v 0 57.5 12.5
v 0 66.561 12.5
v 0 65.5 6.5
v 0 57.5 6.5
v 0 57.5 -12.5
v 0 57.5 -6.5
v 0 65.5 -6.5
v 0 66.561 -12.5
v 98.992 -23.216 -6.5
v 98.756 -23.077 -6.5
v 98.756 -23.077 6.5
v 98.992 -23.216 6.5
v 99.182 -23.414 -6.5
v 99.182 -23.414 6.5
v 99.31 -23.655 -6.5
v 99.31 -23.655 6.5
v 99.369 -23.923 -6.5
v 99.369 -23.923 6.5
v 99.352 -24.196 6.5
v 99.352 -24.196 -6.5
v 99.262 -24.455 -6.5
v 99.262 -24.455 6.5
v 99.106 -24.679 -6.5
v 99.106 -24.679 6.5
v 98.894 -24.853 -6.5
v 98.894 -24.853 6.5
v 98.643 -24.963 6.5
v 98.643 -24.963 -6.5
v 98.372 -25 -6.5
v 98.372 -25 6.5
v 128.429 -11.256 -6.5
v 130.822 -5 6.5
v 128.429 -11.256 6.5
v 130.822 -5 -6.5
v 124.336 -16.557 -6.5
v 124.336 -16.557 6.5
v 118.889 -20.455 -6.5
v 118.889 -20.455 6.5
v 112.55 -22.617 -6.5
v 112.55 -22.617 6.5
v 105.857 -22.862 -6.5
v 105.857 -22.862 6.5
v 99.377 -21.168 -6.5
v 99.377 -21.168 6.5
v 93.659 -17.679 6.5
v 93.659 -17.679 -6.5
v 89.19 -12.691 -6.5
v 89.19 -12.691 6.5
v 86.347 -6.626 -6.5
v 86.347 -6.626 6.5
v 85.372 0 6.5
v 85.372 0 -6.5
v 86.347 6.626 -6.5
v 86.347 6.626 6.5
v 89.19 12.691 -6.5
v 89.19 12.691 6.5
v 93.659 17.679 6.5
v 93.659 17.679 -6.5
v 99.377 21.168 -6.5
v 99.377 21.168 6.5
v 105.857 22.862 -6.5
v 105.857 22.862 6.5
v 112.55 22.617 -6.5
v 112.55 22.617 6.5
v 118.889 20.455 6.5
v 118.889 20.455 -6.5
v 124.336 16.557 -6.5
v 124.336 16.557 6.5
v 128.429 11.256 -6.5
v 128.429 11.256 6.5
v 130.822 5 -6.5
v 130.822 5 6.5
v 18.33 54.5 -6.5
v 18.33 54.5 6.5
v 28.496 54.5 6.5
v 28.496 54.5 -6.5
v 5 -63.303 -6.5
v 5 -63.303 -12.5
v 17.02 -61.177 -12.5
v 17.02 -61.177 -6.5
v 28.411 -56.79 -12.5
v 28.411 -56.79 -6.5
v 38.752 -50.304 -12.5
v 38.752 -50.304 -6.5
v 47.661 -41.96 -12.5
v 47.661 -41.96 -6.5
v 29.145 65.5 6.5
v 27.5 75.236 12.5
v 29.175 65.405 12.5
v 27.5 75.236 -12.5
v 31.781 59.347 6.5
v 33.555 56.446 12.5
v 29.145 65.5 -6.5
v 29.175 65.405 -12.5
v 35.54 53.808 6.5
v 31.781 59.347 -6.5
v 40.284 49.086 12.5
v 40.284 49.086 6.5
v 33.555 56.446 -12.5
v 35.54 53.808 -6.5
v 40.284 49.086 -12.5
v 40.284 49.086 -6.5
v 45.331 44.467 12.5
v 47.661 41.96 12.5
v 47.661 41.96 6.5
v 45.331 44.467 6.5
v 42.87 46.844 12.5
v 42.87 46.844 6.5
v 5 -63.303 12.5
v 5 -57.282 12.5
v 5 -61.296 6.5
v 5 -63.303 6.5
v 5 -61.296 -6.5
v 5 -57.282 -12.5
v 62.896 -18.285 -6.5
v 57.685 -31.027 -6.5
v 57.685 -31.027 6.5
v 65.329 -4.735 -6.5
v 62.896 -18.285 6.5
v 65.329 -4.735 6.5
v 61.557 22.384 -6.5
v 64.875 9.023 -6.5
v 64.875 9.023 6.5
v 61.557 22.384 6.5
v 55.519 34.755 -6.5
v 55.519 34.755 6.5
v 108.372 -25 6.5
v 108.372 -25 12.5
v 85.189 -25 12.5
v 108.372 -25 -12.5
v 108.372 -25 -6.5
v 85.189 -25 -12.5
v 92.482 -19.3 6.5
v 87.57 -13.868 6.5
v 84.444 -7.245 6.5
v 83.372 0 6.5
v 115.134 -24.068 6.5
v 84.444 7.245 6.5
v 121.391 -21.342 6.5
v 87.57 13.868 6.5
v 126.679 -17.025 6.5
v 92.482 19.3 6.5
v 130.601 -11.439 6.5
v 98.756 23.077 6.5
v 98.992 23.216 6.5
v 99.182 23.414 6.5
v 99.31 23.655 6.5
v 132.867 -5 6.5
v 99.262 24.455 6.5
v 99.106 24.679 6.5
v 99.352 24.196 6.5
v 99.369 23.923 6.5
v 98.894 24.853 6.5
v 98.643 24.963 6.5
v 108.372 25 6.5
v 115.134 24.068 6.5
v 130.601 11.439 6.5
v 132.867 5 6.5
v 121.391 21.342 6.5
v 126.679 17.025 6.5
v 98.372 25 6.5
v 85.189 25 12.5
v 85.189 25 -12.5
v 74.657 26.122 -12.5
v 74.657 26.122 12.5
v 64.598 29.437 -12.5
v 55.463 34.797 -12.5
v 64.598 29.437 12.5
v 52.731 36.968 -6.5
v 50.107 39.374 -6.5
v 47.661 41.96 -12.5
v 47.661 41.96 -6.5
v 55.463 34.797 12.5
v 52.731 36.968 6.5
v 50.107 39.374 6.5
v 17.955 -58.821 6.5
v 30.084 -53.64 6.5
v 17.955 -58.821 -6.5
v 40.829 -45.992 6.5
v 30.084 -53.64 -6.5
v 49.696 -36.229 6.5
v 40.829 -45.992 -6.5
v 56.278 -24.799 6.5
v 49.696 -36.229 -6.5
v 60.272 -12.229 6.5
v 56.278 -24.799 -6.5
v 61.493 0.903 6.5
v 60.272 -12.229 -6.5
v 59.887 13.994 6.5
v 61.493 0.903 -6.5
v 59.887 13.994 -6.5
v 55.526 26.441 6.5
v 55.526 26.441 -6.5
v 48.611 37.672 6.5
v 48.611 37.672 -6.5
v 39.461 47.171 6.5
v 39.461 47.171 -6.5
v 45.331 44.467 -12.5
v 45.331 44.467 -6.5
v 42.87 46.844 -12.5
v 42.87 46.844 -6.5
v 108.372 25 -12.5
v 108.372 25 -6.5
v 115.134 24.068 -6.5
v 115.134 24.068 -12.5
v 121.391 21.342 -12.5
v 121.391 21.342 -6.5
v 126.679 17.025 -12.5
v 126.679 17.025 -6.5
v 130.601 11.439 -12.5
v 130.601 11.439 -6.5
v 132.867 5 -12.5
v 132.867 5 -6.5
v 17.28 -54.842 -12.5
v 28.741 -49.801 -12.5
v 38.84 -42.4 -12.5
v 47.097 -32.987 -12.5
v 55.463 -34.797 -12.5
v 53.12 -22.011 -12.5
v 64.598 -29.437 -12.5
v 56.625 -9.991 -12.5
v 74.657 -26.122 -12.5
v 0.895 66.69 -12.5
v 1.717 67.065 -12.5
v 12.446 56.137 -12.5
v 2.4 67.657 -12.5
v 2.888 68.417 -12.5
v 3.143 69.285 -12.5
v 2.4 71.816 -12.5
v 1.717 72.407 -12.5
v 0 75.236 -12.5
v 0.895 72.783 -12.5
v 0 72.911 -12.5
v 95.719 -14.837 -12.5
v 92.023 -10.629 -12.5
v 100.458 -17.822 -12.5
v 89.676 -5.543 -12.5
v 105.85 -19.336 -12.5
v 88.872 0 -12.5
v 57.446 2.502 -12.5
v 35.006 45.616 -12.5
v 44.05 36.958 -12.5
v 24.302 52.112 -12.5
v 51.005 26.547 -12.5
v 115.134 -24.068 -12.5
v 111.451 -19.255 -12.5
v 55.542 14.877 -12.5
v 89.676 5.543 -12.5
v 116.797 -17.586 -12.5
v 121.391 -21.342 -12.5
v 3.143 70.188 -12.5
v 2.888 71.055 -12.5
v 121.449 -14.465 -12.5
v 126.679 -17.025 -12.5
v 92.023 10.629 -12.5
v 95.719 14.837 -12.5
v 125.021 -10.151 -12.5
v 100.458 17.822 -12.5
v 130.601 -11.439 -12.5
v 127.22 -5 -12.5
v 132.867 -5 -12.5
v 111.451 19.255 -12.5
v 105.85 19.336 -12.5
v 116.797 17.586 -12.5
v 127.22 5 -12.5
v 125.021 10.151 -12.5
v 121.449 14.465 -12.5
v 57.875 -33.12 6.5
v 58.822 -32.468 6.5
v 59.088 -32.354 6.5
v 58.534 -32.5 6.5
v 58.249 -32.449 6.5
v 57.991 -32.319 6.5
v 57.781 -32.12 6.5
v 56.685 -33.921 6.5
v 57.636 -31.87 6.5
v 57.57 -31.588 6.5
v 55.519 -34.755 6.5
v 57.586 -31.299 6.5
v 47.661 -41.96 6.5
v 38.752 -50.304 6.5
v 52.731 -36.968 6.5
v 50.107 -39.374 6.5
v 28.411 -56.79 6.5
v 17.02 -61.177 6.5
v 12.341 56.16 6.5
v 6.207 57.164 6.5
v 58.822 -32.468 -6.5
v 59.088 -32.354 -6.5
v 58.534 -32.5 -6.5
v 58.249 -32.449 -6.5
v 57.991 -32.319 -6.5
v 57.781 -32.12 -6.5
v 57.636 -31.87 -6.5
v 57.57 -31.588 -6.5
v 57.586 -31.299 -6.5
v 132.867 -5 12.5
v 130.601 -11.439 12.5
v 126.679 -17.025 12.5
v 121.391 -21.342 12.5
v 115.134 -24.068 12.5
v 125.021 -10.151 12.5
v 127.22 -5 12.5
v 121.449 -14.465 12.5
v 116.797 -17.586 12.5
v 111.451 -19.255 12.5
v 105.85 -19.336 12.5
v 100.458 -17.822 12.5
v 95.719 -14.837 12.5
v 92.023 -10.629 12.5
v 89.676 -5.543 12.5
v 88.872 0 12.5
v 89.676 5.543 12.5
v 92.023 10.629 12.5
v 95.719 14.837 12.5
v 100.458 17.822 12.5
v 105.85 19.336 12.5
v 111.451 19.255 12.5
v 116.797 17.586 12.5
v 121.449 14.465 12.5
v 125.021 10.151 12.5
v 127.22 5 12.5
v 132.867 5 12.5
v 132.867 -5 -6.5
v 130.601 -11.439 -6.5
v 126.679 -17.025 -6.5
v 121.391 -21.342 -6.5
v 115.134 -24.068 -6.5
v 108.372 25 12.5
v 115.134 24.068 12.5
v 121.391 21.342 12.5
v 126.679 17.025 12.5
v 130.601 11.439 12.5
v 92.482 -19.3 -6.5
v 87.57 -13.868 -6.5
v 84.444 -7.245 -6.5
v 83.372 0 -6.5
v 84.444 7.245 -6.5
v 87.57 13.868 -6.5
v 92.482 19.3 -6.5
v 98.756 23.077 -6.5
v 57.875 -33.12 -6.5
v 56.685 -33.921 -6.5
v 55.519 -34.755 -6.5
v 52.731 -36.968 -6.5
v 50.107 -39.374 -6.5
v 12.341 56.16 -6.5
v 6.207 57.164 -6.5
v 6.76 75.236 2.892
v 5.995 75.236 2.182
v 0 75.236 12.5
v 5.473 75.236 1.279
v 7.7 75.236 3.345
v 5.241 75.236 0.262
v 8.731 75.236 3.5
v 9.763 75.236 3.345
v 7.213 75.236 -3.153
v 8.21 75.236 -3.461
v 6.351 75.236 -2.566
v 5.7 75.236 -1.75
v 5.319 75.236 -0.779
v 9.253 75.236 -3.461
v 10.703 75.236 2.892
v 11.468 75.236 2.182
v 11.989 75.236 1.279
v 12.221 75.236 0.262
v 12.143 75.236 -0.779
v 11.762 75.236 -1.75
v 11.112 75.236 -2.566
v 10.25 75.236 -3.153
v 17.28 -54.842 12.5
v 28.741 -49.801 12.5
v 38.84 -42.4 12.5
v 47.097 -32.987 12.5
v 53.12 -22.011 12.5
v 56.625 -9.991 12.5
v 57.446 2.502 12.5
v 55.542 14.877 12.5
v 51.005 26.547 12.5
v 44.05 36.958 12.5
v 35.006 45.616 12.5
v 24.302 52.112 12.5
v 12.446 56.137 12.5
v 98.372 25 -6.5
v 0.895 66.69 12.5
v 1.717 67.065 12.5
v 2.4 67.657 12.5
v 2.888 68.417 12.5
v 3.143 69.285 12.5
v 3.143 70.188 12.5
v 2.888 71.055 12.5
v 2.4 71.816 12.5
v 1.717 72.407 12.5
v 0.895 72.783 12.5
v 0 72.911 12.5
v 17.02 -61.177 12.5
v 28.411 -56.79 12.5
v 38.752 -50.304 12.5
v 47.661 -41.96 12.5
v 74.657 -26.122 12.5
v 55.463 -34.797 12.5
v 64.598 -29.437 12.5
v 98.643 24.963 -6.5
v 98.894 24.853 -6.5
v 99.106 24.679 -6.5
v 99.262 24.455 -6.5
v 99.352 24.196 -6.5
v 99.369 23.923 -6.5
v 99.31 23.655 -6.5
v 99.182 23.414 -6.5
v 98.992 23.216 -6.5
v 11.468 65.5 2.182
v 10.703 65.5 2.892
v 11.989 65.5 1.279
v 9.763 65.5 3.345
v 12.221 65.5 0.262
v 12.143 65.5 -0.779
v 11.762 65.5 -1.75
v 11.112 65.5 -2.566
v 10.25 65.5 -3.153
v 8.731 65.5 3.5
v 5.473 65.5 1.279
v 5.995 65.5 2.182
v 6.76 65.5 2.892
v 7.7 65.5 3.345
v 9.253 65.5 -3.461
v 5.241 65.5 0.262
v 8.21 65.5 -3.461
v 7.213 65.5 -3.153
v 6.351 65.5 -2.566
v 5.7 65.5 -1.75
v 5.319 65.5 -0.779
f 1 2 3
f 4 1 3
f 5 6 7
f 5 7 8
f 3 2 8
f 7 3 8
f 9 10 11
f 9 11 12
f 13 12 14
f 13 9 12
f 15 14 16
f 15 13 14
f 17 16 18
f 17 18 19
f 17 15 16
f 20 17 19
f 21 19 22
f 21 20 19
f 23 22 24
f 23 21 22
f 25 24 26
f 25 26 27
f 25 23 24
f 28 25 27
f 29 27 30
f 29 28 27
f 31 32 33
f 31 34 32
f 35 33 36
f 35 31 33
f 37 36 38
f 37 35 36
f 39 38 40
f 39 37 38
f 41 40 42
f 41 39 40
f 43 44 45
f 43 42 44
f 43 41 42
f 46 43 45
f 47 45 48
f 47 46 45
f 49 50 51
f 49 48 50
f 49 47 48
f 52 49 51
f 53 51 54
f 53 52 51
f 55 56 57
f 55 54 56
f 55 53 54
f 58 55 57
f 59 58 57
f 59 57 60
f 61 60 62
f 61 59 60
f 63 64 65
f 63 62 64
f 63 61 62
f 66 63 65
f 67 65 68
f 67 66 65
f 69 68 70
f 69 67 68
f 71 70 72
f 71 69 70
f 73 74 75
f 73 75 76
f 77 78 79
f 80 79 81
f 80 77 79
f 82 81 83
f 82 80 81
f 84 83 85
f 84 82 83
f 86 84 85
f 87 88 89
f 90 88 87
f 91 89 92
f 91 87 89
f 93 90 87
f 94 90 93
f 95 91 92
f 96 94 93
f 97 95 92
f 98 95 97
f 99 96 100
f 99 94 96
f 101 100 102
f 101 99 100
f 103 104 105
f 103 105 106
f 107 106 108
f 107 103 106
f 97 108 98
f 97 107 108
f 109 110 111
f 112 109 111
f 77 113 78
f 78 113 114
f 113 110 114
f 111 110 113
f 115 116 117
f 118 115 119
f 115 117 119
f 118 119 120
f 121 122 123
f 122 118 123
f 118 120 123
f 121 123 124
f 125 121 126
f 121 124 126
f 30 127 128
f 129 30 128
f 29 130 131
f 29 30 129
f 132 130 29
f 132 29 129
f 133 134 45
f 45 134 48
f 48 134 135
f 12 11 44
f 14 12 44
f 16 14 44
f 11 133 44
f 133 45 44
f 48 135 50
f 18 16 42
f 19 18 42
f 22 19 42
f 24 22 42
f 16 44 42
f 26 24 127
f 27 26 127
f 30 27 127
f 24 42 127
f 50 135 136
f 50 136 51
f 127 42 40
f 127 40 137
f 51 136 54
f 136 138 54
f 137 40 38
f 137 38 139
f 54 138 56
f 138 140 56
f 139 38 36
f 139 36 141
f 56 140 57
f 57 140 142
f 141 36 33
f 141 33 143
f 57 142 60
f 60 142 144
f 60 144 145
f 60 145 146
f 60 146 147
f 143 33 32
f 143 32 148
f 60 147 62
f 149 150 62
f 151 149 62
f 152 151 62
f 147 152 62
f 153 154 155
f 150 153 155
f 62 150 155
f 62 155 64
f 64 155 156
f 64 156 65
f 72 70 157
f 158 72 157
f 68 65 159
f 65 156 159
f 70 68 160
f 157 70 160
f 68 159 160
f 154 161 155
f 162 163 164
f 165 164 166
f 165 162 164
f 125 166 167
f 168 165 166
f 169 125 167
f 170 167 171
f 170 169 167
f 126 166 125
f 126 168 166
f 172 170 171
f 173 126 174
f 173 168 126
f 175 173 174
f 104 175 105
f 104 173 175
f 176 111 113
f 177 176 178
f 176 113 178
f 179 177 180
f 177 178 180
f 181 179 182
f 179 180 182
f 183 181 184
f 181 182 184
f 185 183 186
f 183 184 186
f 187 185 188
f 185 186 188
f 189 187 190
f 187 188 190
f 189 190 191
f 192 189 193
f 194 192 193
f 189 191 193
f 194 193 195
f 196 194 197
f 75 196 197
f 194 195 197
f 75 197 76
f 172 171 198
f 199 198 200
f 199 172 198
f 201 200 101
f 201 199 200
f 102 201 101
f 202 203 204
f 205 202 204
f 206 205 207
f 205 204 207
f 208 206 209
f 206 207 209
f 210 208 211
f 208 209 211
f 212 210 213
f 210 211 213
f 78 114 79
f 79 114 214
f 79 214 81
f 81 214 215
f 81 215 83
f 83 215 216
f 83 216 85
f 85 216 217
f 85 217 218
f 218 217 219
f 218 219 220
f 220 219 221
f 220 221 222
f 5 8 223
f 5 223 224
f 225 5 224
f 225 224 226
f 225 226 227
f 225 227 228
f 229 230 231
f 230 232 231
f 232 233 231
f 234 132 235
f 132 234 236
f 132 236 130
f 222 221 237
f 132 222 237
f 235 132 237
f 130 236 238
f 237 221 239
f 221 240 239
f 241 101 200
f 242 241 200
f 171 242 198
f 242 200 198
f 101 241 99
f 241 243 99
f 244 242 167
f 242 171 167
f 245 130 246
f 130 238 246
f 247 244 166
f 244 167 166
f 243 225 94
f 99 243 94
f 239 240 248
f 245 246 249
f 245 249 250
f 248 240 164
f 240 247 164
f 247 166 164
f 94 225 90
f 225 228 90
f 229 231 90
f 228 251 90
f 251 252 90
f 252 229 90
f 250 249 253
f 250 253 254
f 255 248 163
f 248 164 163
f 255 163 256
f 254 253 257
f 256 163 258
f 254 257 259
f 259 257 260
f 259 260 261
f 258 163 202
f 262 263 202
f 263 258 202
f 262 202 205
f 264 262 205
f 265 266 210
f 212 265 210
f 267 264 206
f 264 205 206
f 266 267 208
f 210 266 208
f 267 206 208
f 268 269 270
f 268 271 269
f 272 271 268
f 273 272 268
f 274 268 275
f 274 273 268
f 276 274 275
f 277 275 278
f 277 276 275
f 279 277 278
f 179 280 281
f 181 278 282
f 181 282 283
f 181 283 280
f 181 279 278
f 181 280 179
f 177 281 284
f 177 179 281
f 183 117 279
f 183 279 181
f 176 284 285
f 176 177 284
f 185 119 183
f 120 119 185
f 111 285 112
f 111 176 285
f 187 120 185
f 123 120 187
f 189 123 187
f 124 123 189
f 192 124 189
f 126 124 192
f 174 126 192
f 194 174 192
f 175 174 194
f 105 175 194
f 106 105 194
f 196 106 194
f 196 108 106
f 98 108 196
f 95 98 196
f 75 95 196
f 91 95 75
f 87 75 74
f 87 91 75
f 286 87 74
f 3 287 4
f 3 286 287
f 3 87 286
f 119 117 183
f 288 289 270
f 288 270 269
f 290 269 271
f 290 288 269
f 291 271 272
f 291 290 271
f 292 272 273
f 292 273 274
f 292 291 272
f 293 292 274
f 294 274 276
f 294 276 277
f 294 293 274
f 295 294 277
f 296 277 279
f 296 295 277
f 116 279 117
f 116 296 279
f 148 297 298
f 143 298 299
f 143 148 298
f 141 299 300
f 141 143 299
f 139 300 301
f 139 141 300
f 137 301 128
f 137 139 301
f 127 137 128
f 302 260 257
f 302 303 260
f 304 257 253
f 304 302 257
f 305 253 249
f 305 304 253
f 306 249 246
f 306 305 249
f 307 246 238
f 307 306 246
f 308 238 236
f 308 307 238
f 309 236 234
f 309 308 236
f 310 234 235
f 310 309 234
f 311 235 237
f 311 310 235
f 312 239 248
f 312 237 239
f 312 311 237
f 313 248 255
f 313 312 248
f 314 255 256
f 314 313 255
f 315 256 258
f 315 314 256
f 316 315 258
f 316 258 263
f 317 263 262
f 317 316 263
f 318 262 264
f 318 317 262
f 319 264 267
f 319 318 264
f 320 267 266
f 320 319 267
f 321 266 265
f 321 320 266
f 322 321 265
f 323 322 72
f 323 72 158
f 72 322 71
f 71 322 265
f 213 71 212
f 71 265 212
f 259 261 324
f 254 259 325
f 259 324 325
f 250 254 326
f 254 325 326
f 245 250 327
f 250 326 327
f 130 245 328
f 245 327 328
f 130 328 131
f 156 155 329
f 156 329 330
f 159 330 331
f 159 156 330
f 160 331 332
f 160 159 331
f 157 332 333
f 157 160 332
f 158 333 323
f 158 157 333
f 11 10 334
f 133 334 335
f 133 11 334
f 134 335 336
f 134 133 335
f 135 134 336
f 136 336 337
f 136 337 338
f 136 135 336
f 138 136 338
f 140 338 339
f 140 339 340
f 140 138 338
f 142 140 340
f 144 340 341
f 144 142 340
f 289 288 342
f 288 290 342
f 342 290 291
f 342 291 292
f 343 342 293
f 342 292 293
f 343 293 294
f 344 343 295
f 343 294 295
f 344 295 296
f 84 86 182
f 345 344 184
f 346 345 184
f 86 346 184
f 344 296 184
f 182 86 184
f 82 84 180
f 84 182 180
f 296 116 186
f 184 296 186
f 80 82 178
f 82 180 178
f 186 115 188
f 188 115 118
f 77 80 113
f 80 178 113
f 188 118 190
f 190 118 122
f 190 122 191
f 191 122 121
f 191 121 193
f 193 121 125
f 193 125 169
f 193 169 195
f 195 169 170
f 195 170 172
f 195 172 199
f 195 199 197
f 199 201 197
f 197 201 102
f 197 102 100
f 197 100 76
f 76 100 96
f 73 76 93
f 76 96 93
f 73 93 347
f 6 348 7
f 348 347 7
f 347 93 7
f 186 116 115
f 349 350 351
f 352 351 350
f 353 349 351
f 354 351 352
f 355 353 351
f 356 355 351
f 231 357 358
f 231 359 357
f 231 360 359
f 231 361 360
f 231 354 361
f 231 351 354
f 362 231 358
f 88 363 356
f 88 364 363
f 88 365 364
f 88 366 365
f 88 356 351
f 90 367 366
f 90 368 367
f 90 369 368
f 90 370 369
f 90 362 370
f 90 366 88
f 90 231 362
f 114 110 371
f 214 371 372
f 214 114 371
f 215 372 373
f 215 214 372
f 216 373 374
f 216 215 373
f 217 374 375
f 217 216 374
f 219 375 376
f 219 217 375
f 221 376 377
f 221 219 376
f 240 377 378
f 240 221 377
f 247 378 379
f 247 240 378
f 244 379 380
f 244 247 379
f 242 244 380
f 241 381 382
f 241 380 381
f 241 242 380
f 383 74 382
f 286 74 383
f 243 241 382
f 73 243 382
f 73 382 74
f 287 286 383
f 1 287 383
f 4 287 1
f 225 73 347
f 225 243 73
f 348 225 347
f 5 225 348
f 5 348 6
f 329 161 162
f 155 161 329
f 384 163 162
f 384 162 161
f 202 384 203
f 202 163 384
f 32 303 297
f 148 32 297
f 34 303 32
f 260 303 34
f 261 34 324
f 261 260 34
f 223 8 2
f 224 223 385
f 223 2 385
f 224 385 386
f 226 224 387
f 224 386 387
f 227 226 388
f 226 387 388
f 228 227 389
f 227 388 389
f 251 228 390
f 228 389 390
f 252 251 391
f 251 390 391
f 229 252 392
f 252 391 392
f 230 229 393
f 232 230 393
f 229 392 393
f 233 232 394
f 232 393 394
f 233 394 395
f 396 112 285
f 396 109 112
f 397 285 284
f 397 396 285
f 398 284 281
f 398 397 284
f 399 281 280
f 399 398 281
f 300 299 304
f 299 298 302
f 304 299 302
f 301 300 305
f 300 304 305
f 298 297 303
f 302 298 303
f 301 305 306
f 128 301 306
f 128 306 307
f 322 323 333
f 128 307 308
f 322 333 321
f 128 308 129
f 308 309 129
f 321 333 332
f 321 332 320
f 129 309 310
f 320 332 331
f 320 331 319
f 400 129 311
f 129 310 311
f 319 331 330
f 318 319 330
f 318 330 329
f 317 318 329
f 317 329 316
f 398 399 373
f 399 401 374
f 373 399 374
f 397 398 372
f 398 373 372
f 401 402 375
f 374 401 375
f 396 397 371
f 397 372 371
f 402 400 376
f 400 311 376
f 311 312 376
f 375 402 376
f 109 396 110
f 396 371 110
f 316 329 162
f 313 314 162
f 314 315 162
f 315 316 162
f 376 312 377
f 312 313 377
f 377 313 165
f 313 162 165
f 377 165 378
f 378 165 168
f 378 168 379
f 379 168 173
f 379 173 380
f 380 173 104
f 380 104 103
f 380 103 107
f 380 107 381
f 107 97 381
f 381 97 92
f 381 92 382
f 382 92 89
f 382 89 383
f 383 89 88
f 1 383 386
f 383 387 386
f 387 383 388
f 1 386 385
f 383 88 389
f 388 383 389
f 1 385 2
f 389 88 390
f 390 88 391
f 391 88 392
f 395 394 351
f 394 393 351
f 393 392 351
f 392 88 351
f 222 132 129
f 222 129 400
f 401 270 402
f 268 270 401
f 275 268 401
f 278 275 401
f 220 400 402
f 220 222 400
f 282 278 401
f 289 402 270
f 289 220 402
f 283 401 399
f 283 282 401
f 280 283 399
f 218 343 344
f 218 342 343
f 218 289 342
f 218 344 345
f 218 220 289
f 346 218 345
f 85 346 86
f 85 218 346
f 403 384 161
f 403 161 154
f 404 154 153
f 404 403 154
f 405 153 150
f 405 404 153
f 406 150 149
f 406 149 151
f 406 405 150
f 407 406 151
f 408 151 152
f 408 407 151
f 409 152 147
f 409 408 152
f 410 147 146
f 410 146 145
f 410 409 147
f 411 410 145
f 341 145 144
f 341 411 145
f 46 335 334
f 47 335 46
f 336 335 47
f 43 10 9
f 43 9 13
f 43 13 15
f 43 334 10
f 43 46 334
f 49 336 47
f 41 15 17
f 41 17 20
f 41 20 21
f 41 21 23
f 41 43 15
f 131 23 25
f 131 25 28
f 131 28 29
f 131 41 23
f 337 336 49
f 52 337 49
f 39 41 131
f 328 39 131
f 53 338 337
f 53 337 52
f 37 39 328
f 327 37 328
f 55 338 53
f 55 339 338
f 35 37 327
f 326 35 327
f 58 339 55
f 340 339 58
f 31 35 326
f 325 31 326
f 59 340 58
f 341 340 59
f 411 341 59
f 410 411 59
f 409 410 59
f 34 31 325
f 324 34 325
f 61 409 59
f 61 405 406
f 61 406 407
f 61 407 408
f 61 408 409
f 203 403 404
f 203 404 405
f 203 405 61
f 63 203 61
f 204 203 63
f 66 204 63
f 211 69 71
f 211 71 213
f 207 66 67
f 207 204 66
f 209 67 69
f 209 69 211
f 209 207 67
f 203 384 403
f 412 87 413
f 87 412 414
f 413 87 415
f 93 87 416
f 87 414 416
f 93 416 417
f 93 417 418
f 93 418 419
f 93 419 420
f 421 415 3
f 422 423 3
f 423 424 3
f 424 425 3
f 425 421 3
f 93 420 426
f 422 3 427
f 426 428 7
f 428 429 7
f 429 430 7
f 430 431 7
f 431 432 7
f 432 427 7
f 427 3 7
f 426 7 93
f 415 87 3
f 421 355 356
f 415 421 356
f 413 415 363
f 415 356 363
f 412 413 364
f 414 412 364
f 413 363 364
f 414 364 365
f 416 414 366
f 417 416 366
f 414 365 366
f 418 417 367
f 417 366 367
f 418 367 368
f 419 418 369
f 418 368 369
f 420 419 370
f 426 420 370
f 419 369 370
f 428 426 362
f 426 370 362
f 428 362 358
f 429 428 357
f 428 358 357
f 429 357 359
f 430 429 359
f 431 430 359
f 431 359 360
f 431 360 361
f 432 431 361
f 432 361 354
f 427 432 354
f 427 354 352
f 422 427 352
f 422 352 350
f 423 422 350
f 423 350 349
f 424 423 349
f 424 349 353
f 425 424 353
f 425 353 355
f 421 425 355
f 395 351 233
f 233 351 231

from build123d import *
from build123d.topology import SkipClean

# Parameters (mm, degrees)
SKETCH1_R                        = 63.5
SKETCH1_R_2                      = 57.5
MAIN_SHAPE_DEPTH                 = 12.5
MOTOR_MOUNT_REACH                = 92.668
MOTOR_MOUNT_DIRECTION_2_REACH    = 92.668
HARNESS_START                    = -12.5
HARNESS_DEPTH                    = 25
HARNESS_FILLET_R                 = 35
SKETCH3_R                        = 65.5
SKETCH3_R_2                      = 61.5
MAIN_SLOT_DEPTH                  = 6.5
SKETCH8_R                        = 19.5
MOTOR_CUT_DEPTH                  = 154.6383962
SKETCH9_R                        = 25
SKETCH9_R_2                      = 23
MOTOR_SLOT_DEPTH                 = 6.5
MOTOR_MOUNT_FILLET_R             = 50
SKETCH17_W                       = 6.80384635
SKETCH17_H                       = 10
MOTOR_KEYWAY_DEPTH               = 156.156394606
MOTOR_MOUNT_FILLET_OF_MIRROR_2_R = 50
BOLT_HOLES_REACH                 = 194.503
BOLT_HOLES_END_RADIUS            = 65.5
SKETCH13_R                       = 3.5
SKETCH15_W                       = 10
SKETCH15_H                       = 25
MAIN_KEYWAY_DEPTH                = 154.200127936
HARNESS_CUT_DEPTH                = 154.200127936
HARNESS_CUT_DEPTH_BACK           = 154.200127936
SKETCH19_W                       = 13
SKETCH19_H                       = 11
SKETCH22_R                       = 3.175
CUT_EXTRUDE1_DEPTH               = 155.72242625
FILLET1_START                    = -6.5
FILLET1_DEPTH                    = 13
SKETCH18_W                       = 87.910822745
SKETCH18_H                       = 167.162250969
SPLIT_FOR_PRINTING_DEPTH         = 154.200127887


with BuildPart() as part:
    # Sketch1 → main shape (new, symmetric)
    with BuildSketch(Plane.XY):
        Circle(SKETCH1_R)
        Circle(SKETCH1_R_2, mode=Mode.SUBTRACT)
    extrude(amount=MAIN_SHAPE_DEPTH, both=True)

    # motor mount: up to this face of the body (flat: up to its plane)
    motor_mount_end = Plane(part.part.faces().sort_by_distance((-61.703948776, 0, 12.5))[0])
    # Sketch6 → motor mount (add, up to the picked face)
    with BuildSketch(Plane.XY, mode=Mode.PRIVATE) as motor_mount_sk1:
        with BuildLine():
            Line((-58.37165408, 25), (-108.37165408, 25))
            ThreePointArc((-108.37165408, 25), (-133.37165408, 0), (-108.37165408, -25))
            Line((-108.37165408, -25), (-58.37165408, -25))
            ThreePointArc((-58.37165408, -25), (-63.5, 0), (-58.37165408, 25))
        make_face()
    motor_mount_tool1 = split(extrude(motor_mount_sk1.sketch, amount=MOTOR_MOUNT_REACH, mode=Mode.PRIVATE), bisect_by=motor_mount_end, keep=Keep.BOTH, mode=Mode.PRIVATE)
    motor_mount = motor_mount_tool1.solids().sort_by(Axis((-95.130644, 0, 0), (0, 0, 1)))[0]
    add(motor_mount)

    # motor mount direction 2: up to this face of the body (flat: up to its plane)
    motor_mount_direction_2_end = Plane(part.part.faces().sort_by_distance((-61.703948776, 0, -12.5))[0])
    # Sketch6 → motor mount direction 2 (add, up to the picked face)
    with BuildSketch(Plane.XY, mode=Mode.PRIVATE) as motor_mount_direction_2_sk1:
        with BuildLine():
            Line((-58.37165408, 25), (-108.37165408, 25))
            ThreePointArc((-108.37165408, 25), (-133.37165408, 0), (-108.37165408, -25))
            Line((-108.37165408, -25), (-58.37165408, -25))
            ThreePointArc((-58.37165408, -25), (-63.5, 0), (-58.37165408, 25))
        make_face()
    motor_mount_direction_2_tool1 = split(extrude(motor_mount_direction_2_sk1.sketch, amount=-MOTOR_MOUNT_DIRECTION_2_REACH, mode=Mode.PRIVATE), bisect_by=motor_mount_direction_2_end, keep=Keep.BOTH, mode=Mode.PRIVATE)
    motor_mount_direction_2 = motor_mount_direction_2_tool1.solids().sort_by(Axis((-95.130644, 0, 0), (0, 0, -1)))[0]
    add(motor_mount_direction_2)

    # Sketch11 → harness (add)
    with BuildSketch(Plane.XY.offset(HARNESS_START)):
        with BuildLine():
            Line((27.5, 75.236352085), (27.5, 57.236352085))
            ThreePointArc((27.5, 57.236352085), (0, 63.5), (-27.5, 57.236352085))
            Line((-27.5, 57.236352085), (-27.5, 75.236352085))
            Line((-27.5, 75.236352085), (27.5, 75.236352085))
        make_face()
    extrude(amount=HARNESS_DEPTH)

    # harness fillet
    # the kernel refuses this fillet: 35 mm, written as the material it adds along each edge
    with BuildSketch(Plane(origin=(27.5, 57.236352085, -12.5), x_dir=(0.8432130840370694, -0.5375794777599814, 0), z_dir=(0, 0, 1))) as harness_fillet_piece_1:
        with BuildLine():
            CenterArc((19.339811168, 34.749695763), HARNESS_FILLET_R, 214.0002145, 49.143374048)
            Line((-9.6764306, 15.177835513), (-10.256755435, 14.786398308))
            ThreePointArc((-10.256755435, 14.786398308), (-5.428464459, 7.212612122), (-0.590249159, -0.376305634))
            Line((-0.590249159, -0.376305634), (0.083567085, -0.694993915))
            ThreePointArc((0.083567085, -0.694993915), (7.580728452, -0.245876599), (15.077889818, -0.694993915))
            Line((15.077889818, -0.694993915), (15.161456903, 0))
        make_face()
    extrude(amount=25)
    with BuildSketch(Plane(origin=(-27.5, 57.236352085, -12.5), x_dir=(-0.8432130840370696, -0.5375794777599807, 0), z_dir=(0, 0, 1))) as harness_fillet_piece_2:
        with BuildLine():
            CenterArc((19.339811168, -34.749695763), HARNESS_FILLET_R, 96.856411452, 49.143374048)
            Line((-9.6764306, -15.177835513), (-10.256755435, -14.786398308))
            ThreePointArc((-10.256755435, -14.786398308), (-5.428464459, -7.212612122), (-0.590249159, 0.376305634))
            Line((-0.590249159, 0.376305634), (0.083567085, 0.694993915))
            ThreePointArc((0.083567085, 0.694993915), (7.580728452, 0.245876599), (15.077889818, 0.694993915))
            Line((15.077889818, 0.694993915), (15.161456903, 0))
        make_face()
    extrude(amount=25)

    # Sketch3 → main slot (cut, symmetric)
    with BuildSketch(Plane.XY):
        Circle(SKETCH3_R)
        Circle(SKETCH3_R_2, mode=Mode.SUBTRACT)
    main_slot = extrude(amount=MAIN_SLOT_DEPTH, both=True, mode=Mode.SUBTRACT)

    # Sketch8 → motor cut (cut, symmetric)
    with BuildSketch(Plane.XY):
        with Locations((-108.37165408, 0)):
            Circle(SKETCH8_R)
    motor_cut = extrude(amount=MOTOR_CUT_DEPTH, both=True, mode=Mode.SUBTRACT)

    # Sketch9 → motor slot (cut, symmetric)
    with BuildSketch(Plane.XY):
        with Locations((-108.37165408, 0)):
            Circle(SKETCH9_R)
        with Locations((-108.37165408, 0)):
            Circle(SKETCH9_R_2, mode=Mode.SUBTRACT)
    motor_slot = extrude(amount=MOTOR_SLOT_DEPTH, both=True, mode=Mode.SUBTRACT)

    # motor mount fillet
    # the kernel refuses this fillet: 50 mm, written as the material it adds along each edge
    with BuildSketch(Plane(origin=(-58.37165408, 25, -12.5), x_dir=(0.5339491439674308, 0.845516594548237, 0), z_dir=(0, 0, 1))) as motor_mount_fillet_piece_1_section:
        with BuildLine():
            CenterArc((27.956466708, 49.372386437), MOTOR_MOUNT_FILLET_R, 212.272672979, 48.639624147)
            Line((-14.31936302, 22.674929238), (0, 0))
            ThreePointArc((0, 0), (10.029579864, 0.797069225), (20.059159728, 0))
        make_face()
    motor_mount_fillet_piece_1 = extrude(amount=6, mode=Mode.PRIVATE)
    motor_mount_fillet_piece_1 = motor_mount_fillet_piece_1 & Plane(origin=(0, 0, -12.5), x_dir=(1, 0, 0), z_dir=(0, 0, 1)) * Cylinder(65.5, 103, mode=Mode.PRIVATE)
    add(motor_mount_fillet_piece_1)
    with BuildSketch(Plane(origin=(-58.37165408, 25, -12.5), x_dir=(0.5339491439674308, 0.845516594548237, 0), z_dir=(0, 0, 1))) as motor_mount_fillet_piece_2_section:
        with BuildLine():
            CenterArc((27.956466708, 49.372386437), MOTOR_MOUNT_FILLET_R, 212.272672979, 48.639624147)
            Line((-14.31936302, 22.674929238), (0, 0))
            ThreePointArc((0, 0), (10.029579864, 0.797069225), (20.059159728, 0))
        make_face()
    motor_mount_fillet_piece_2 = extrude(amount=6, mode=Mode.PRIVATE)
    motor_mount_fillet_piece_2 = motor_mount_fillet_piece_2 - Plane(origin=(0, 0, -12.5), x_dir=(1, 0, 0), z_dir=(0, 0, 1)) * Cylinder(65.5, 103, mode=Mode.PRIVATE)
    add(motor_mount_fillet_piece_2)
    with BuildSketch(Plane(origin=(-58.37165408, 25, -12.5), x_dir=(0.5339491439674308, 0.845516594548237, 0), z_dir=(0, 0, 1))) as motor_mount_fillet_piece_3_section:
        with BuildLine():
            CenterArc((27.956466708, 49.372386437), MOTOR_MOUNT_FILLET_R, 212.272672979, 48.639624147)
            Line((-14.31936302, 22.674929238), (0, 0))
            ThreePointArc((0, 0), (10.029579864, 0.797069225), (20.059159728, 0))
        make_face()
    motor_mount_fillet_piece_3 = extrude(amount=73.044601445, mode=Mode.PRIVATE)
    motor_mount_fillet_piece_3 = split(motor_mount_fillet_piece_3, bisect_by=Plane(origin=(-58.37165408, 25, -6.5), z_dir=(0, 0, 1)), keep=Keep.TOP, mode=Mode.PRIVATE)
    motor_mount_fillet_piece_3 = split(motor_mount_fillet_piece_3, bisect_by=Plane(origin=(-58.37165408, 25, 6.5), z_dir=(0, 0, -1)), keep=Keep.TOP, mode=Mode.PRIVATE)
    motor_mount_fillet_piece_3 = motor_mount_fillet_piece_3 - Plane(origin=(0, 0, -12.5), x_dir=(1, 0, 0), z_dir=(0, 0, 1)) * Cylinder(65.5, 237, mode=Mode.PRIVATE)
    add(motor_mount_fillet_piece_3)
    with BuildSketch(Plane(origin=(-58.37165408, 25, -12.5), x_dir=(0.5339491439674308, 0.845516594548237, 0), z_dir=(0, 0, 1))) as motor_mount_fillet_piece_4_section:
        with BuildLine():
            CenterArc((27.956466708, 49.372386437), MOTOR_MOUNT_FILLET_R, 212.272672979, 48.639624147)
            Line((-14.31936302, 22.674929238), (0, 0))
            ThreePointArc((0, 0), (10.029579864, 0.797069225), (20.059159728, 0))
        make_face()
    motor_mount_fillet_piece_4 = extrude(amount=73.044601445, mode=Mode.PRIVATE)
    motor_mount_fillet_piece_4 = split(motor_mount_fillet_piece_4, bisect_by=Plane(origin=(-58.37165408, 25, 12.5), z_dir=(0, 0, -1)), keep=Keep.TOP, mode=Mode.PRIVATE)
    motor_mount_fillet_piece_4 = split(motor_mount_fillet_piece_4, bisect_by=Plane(origin=(-58.37165408, 25, 6.5), z_dir=(0, 0, 1)), keep=Keep.TOP, mode=Mode.PRIVATE)
    motor_mount_fillet_piece_4 = motor_mount_fillet_piece_4 & Plane(origin=(0, 0, -12.5), x_dir=(1, 0, 0), z_dir=(0, 0, 1)) * Cylinder(65.5, 237, mode=Mode.PRIVATE)
    add(motor_mount_fillet_piece_4)
    with BuildSketch(Plane(origin=(-58.37165408, 25, -12.5), x_dir=(0.5339491439674308, 0.845516594548237, 0), z_dir=(0, 0, 1))) as motor_mount_fillet_piece_5_section:
        with BuildLine():
            CenterArc((27.956466708, 49.372386437), MOTOR_MOUNT_FILLET_R, 212.272672979, 48.639624147)
            Line((-14.31936302, 22.674929238), (0, 0))
            ThreePointArc((0, 0), (10.029579864, 0.797069225), (20.059159728, 0))
        make_face()
    motor_mount_fillet_piece_5 = extrude(amount=73.044601445, mode=Mode.PRIVATE)
    motor_mount_fillet_piece_5 = split(motor_mount_fillet_piece_5, bisect_by=Plane(origin=(-58.37165408, 25, 12.5), z_dir=(0, 0, -1)), keep=Keep.TOP, mode=Mode.PRIVATE)
    motor_mount_fillet_piece_5 = split(motor_mount_fillet_piece_5, bisect_by=Plane(origin=(-58.37165408, 25, 6.5), z_dir=(0, 0, 1)), keep=Keep.TOP, mode=Mode.PRIVATE)
    motor_mount_fillet_piece_5 = motor_mount_fillet_piece_5 - Plane(origin=(0, 0, -12.5), x_dir=(1, 0, 0), z_dir=(0, 0, 1)) * Cylinder(65.5, 237, mode=Mode.PRIVATE)
    add(motor_mount_fillet_piece_5)
    with BuildSketch(Plane(origin=(-58.37165408, -25, 12.5), x_dir=(-1, 0, 0), z_dir=(0, 0, -1))) as motor_mount_fillet_piece_6_section:
        with BuildLine():
            CenterArc((26.817840578, -50), MOTOR_MOUNT_FILLET_R, 90, 48.639624147)
            ThreePointArc((-10.710571166, -16.960352423), (-4.681350326, -8.905770642), (0, 0))
            Line((0, 0), (26.817840578, 0))
        make_face()
    motor_mount_fillet_piece_6 = extrude(amount=6, mode=Mode.PRIVATE)
    motor_mount_fillet_piece_6 = motor_mount_fillet_piece_6 - Plane(origin=(0, 0, 12.5), x_dir=(1, 0, 0), z_dir=(0, 0, 1)) * Cylinder(65.5, 120, mode=Mode.PRIVATE)
    add(motor_mount_fillet_piece_6)
    with BuildSketch(Plane(origin=(-58.37165408, -25, 12.5), x_dir=(-1, 0, 0), z_dir=(0, 0, -1))) as motor_mount_fillet_piece_7_section:
        with BuildLine():
            CenterArc((26.817840578, -50), MOTOR_MOUNT_FILLET_R, 90, 48.639624147)
            ThreePointArc((-10.710571166, -16.960352423), (-4.681350326, -8.905770642), (0, 0))
            Line((0, 0), (26.817840578, 0))
        make_face()
    motor_mount_fillet_piece_7 = extrude(amount=6, mode=Mode.PRIVATE)
    motor_mount_fillet_piece_7 = motor_mount_fillet_piece_7 & Plane(origin=(0, 0, 12.5), x_dir=(1, 0, 0), z_dir=(0, 0, 1)) * Cylinder(65.5, 120, mode=Mode.PRIVATE)
    add(motor_mount_fillet_piece_7)
    with BuildSketch(Plane(origin=(-58.37165408, -25, 12.5), x_dir=(-1, 0, 0), z_dir=(0, 0, -1))) as motor_mount_fillet_piece_8_section:
        with BuildLine():
            CenterArc((26.817840578, -50), MOTOR_MOUNT_FILLET_R, 90, 48.639624147)
            ThreePointArc((-10.710571166, -16.960352423), (-4.681350326, -8.905770642), (0, 0))
            Line((0, 0), (26.817840578, 0))
        make_face()
    motor_mount_fillet_piece_8 = extrude(amount=73.044601445, mode=Mode.PRIVATE)
    motor_mount_fillet_piece_8 = split(motor_mount_fillet_piece_8, bisect_by=Plane(origin=(-58.37165408, -25, 6.5), z_dir=(0, 0, -1)), keep=Keep.TOP, mode=Mode.PRIVATE)
    motor_mount_fillet_piece_8 = motor_mount_fillet_piece_8 - Plane(origin=(0, 0, 12.5), x_dir=(1, 0, 0), z_dir=(0, 0, 1)) * Cylinder(65.5, 254, mode=Mode.PRIVATE)
    motor_mount_fillet_piece_8 = split(motor_mount_fillet_piece_8, bisect_by=Plane(origin=(-58.37165408, -25, -6.5), z_dir=(0, 0, 1)), keep=Keep.TOP, mode=Mode.PRIVATE)
    add(motor_mount_fillet_piece_8)
    with BuildSketch(Plane(origin=(-58.37165408, -25, 12.5), x_dir=(-1, 0, 0), z_dir=(0, 0, -1))) as motor_mount_fillet_piece_9_section:
        with BuildLine():
            CenterArc((26.817840578, -50), MOTOR_MOUNT_FILLET_R, 90, 48.639624147)
            ThreePointArc((-10.710571166, -16.960352423), (-4.681350326, -8.905770642), (0, 0))
            Line((0, 0), (26.817840578, 0))
        make_face()
    motor_mount_fillet_piece_9 = extrude(amount=73.044601445, mode=Mode.PRIVATE)
    motor_mount_fillet_piece_9 = motor_mount_fillet_piece_9 - Plane(origin=(0, 0, 12.5), x_dir=(1, 0, 0), z_dir=(0, 0, 1)) * Cylinder(65.5, 254, mode=Mode.PRIVATE)
    motor_mount_fillet_piece_9 = split(motor_mount_fillet_piece_9, bisect_by=Plane(origin=(-58.37165408, -25, -6.5), z_dir=(0, 0, -1)), keep=Keep.TOP, mode=Mode.PRIVATE)
    motor_mount_fillet_piece_9 = split(motor_mount_fillet_piece_9, bisect_by=Plane(origin=(-58.37165408, -25, -12.5), z_dir=(0, 0, 1)), keep=Keep.TOP, mode=Mode.PRIVATE)
    add(motor_mount_fillet_piece_9)
    with BuildSketch(Plane(origin=(-58.37165408, -25, 12.5), x_dir=(-1, 0, 0), z_dir=(0, 0, -1))) as motor_mount_fillet_piece_10_section:
        with BuildLine():
            CenterArc((26.817840578, -50), MOTOR_MOUNT_FILLET_R, 90, 48.639624147)
            ThreePointArc((-10.710571166, -16.960352423), (-4.681350326, -8.905770642), (0, 0))
            Line((0, 0), (26.817840578, 0))
        make_face()
    motor_mount_fillet_piece_10 = extrude(amount=73.044601445, mode=Mode.PRIVATE)
    motor_mount_fillet_piece_10 = motor_mount_fillet_piece_10 & Plane(origin=(0, 0, 12.5), x_dir=(1, 0, 0), z_dir=(0, 0, 1)) * Cylinder(65.5, 254, mode=Mode.PRIVATE)
    motor_mount_fillet_piece_10 = split(motor_mount_fillet_piece_10, bisect_by=Plane(origin=(-58.37165408, -25, -6.5), z_dir=(0, 0, -1)), keep=Keep.TOP, mode=Mode.PRIVATE)
    motor_mount_fillet_piece_10 = split(motor_mount_fillet_piece_10, bisect_by=Plane(origin=(-58.37165408, -25, -12.5), z_dir=(0, 0, 1)), keep=Keep.TOP, mode=Mode.PRIVATE)
    add(motor_mount_fillet_piece_10)

    # Sketch17 → motor keyway (cut, through all)
    with BuildSketch(Plane(origin=(0, 0, -12.5), x_dir=(-1, 0, 0), z_dir=(0, 0, -1))):
        with Locations((130.62165408, 0)):
            Rectangle(SKETCH17_W, SKETCH17_H)
    motor_keyway = extrude(amount=-MOTOR_KEYWAY_DEPTH, mode=Mode.SUBTRACT)

    # Mirror 2: motor mount, motor mount direction 2, main slot, motor cut, motor slot, motor keyway across plane
    with SkipClean():  # the faces are left unmerged after this step: merging them gives an invalid solid
        add(motor_mount.mirror(Plane(origin=(0, 0, 0), x_dir=(0, 0, 1), z_dir=(1, 0, 0))))
        add(motor_mount_direction_2.mirror(Plane(origin=(0, 0, 0), x_dir=(0, 0, 1), z_dir=(1, 0, 0))))
        add(main_slot.mirror(Plane(origin=(0, 0, 0), x_dir=(0, 0, 1), z_dir=(1, 0, 0))), mode=Mode.SUBTRACT)
        add(motor_cut.mirror(Plane(origin=(0, 0, 0), x_dir=(0, 0, 1), z_dir=(1, 0, 0))), mode=Mode.SUBTRACT)
        add(motor_slot.mirror(Plane(origin=(0, 0, 0), x_dir=(0, 0, 1), z_dir=(1, 0, 0))), mode=Mode.SUBTRACT)
        add(motor_keyway.mirror(Plane(origin=(0, 0, 0), x_dir=(0, 0, 1), z_dir=(1, 0, 0))), mode=Mode.SUBTRACT)

    # motor mount fillet of Mirror 2
    # the kernel refuses this fillet: 50 mm, written as the material it adds along each edge
    with BuildSketch(Plane(origin=(58.37165408, 25, 60.544601445), x_dir=(-0.5339491439674316, 0.8455165945482365, 0), z_dir=(0, 0, -1))) as motor_mount_fillet_of_mirror_2_piece_1_section:
        with BuildLine():
            CenterArc((27.956466708, 49.372386437), MOTOR_MOUNT_FILLET_OF_MIRROR_2_R, 212.272672979, 48.639624147)
            Line((-14.31936302, 22.674929238), (0, 0))
            ThreePointArc((0, 0), (10.029579864, 0.797069225), (20.059159728, 0))
        make_face()
    motor_mount_fillet_of_mirror_2_piece_1 = extrude(amount=73.044601445, mode=Mode.PRIVATE)
    motor_mount_fillet_of_mirror_2_piece_1 = split(motor_mount_fillet_of_mirror_2_piece_1, bisect_by=Plane(origin=(58.37165408, 25, 12.5), z_dir=(0, 0, -1)), keep=Keep.TOP, mode=Mode.PRIVATE)
    motor_mount_fillet_of_mirror_2_piece_1 = split(motor_mount_fillet_of_mirror_2_piece_1, bisect_by=Plane(origin=(58.37165408, 25, 6.5), z_dir=(0, 0, 1)), keep=Keep.TOP, mode=Mode.PRIVATE)
    motor_mount_fillet_of_mirror_2_piece_1 = motor_mount_fillet_of_mirror_2_piece_1 & Plane(origin=(0, 0, 60.544601445), x_dir=(-1, 0, 0), z_dir=(0, 0, 1)) * Cylinder(65.5, 237, mode=Mode.PRIVATE)
    add(motor_mount_fillet_of_mirror_2_piece_1)
    with BuildSketch(Plane(origin=(58.37165408, 25, 60.544601445), x_dir=(-0.5339491439674316, 0.8455165945482365, 0), z_dir=(0, 0, -1))) as motor_mount_fillet_of_mirror_2_piece_2_section:
        with BuildLine():
            CenterArc((27.956466708, 49.372386437), MOTOR_MOUNT_FILLET_OF_MIRROR_2_R, 212.272672979, 48.639624147)
            Line((-14.31936302, 22.674929238), (0, 0))
            ThreePointArc((0, 0), (10.029579864, 0.797069225), (20.059159728, 0))
        make_face()
    motor_mount_fillet_of_mirror_2_piece_2 = extrude(amount=73.044601445, mode=Mode.PRIVATE)
    motor_mount_fillet_of_mirror_2_piece_2 = split(motor_mount_fillet_of_mirror_2_piece_2, bisect_by=Plane(origin=(58.37165408, 25, 12.5), z_dir=(0, 0, -1)), keep=Keep.TOP, mode=Mode.PRIVATE)
    motor_mount_fillet_of_mirror_2_piece_2 = split(motor_mount_fillet_of_mirror_2_piece_2, bisect_by=Plane(origin=(58.37165408, 25, 6.5), z_dir=(0, 0, 1)), keep=Keep.TOP, mode=Mode.PRIVATE)
    motor_mount_fillet_of_mirror_2_piece_2 = motor_mount_fillet_of_mirror_2_piece_2 - Plane(origin=(0, 0, 60.544601445), x_dir=(-1, 0, 0), z_dir=(0, 0, 1)) * Cylinder(65.5, 237, mode=Mode.PRIVATE)
    add(motor_mount_fillet_of_mirror_2_piece_2)
    with BuildSketch(Plane(origin=(58.37165408, 25, 60.544601445), x_dir=(-0.5339491439674316, 0.8455165945482365, 0), z_dir=(0, 0, -1))) as motor_mount_fillet_of_mirror_2_piece_3_section:
        with BuildLine():
            CenterArc((27.956466708, 49.372386437), MOTOR_MOUNT_FILLET_OF_MIRROR_2_R, 212.272672979, 48.639624147)
            Line((-14.31936302, 22.674929238), (0, 0))
            ThreePointArc((0, 0), (10.029579864, 0.797069225), (20.059159728, 0))
        make_face()
    motor_mount_fillet_of_mirror_2_piece_3 = extrude(amount=73.044601445, mode=Mode.PRIVATE)
    motor_mount_fillet_of_mirror_2_piece_3 = split(motor_mount_fillet_of_mirror_2_piece_3, bisect_by=Plane(origin=(58.37165408, 25, 6.5), z_dir=(0, 0, -1)), keep=Keep.TOP, mode=Mode.PRIVATE)
    motor_mount_fillet_of_mirror_2_piece_3 = split(motor_mount_fillet_of_mirror_2_piece_3, bisect_by=Plane(origin=(58.37165408, 25, -6.5), z_dir=(0, 0, 1)), keep=Keep.TOP, mode=Mode.PRIVATE)
    motor_mount_fillet_of_mirror_2_piece_3 = motor_mount_fillet_of_mirror_2_piece_3 - Plane(origin=(0, 0, 60.544601445), x_dir=(-1, 0, 0), z_dir=(0, 0, 1)) * Cylinder(65.5, 237, mode=Mode.PRIVATE)
    add(motor_mount_fillet_of_mirror_2_piece_3)
    with BuildSketch(Plane(origin=(58.37165408, 25, -6.5), x_dir=(-0.5339491439674316, 0.8455165945482365, 0), z_dir=(0, 0, -1))) as motor_mount_fillet_of_mirror_2_piece_4_section:
        with BuildLine():
            CenterArc((27.956466708, 49.372386437), MOTOR_MOUNT_FILLET_OF_MIRROR_2_R, 212.272672979, 48.639624147)
            Line((-14.31936302, 22.674929238), (0, 0))
            ThreePointArc((0, 0), (10.029579864, 0.797069225), (20.059159728, 0))
        make_face()
    motor_mount_fillet_of_mirror_2_piece_4 = extrude(amount=6, mode=Mode.PRIVATE)
    motor_mount_fillet_of_mirror_2_piece_4 = motor_mount_fillet_of_mirror_2_piece_4 & Plane(origin=(0, 0, -6.5), x_dir=(-1, 0, 0), z_dir=(0, 0, 1)) * Cylinder(65.5, 103, mode=Mode.PRIVATE)
    add(motor_mount_fillet_of_mirror_2_piece_4)
    with BuildSketch(Plane(origin=(58.37165408, 25, -6.5), x_dir=(-0.5339491439674316, 0.8455165945482365, 0), z_dir=(0, 0, -1))) as motor_mount_fillet_of_mirror_2_piece_5_section:
        with BuildLine():
            CenterArc((27.956466708, 49.372386437), MOTOR_MOUNT_FILLET_OF_MIRROR_2_R, 212.272672979, 48.639624147)
            Line((-14.31936302, 22.674929238), (0, 0))
            ThreePointArc((0, 0), (10.029579864, 0.797069225), (20.059159728, 0))
        make_face()
    motor_mount_fillet_of_mirror_2_piece_5 = extrude(amount=6, mode=Mode.PRIVATE)
    motor_mount_fillet_of_mirror_2_piece_5 = motor_mount_fillet_of_mirror_2_piece_5 - Plane(origin=(0, 0, -6.5), x_dir=(-1, 0, 0), z_dir=(0, 0, 1)) * Cylinder(65.5, 103, mode=Mode.PRIVATE)
    add(motor_mount_fillet_of_mirror_2_piece_5)
    with BuildSketch(Plane(origin=(58.37165408, -25, -60.544601445), x_dir=(1, 0, 0), z_dir=(0, 0, 1))) as motor_mount_fillet_of_mirror_2_piece_6_section:
        with BuildLine():
            CenterArc((26.817840578, -50), MOTOR_MOUNT_FILLET_OF_MIRROR_2_R, 90, 48.639624147)
            ThreePointArc((-10.710571166, -16.960352423), (-4.681350326, -8.905770642), (0, 0))
            Line((0, 0), (26.817840578, 0))
        make_face()
    motor_mount_fillet_of_mirror_2_piece_6 = extrude(amount=73.044601445, mode=Mode.PRIVATE)
    motor_mount_fillet_of_mirror_2_piece_6 = split(motor_mount_fillet_of_mirror_2_piece_6, bisect_by=Plane(origin=(58.37165408, -25, -12.5), z_dir=(0, 0, 1)), keep=Keep.TOP, mode=Mode.PRIVATE)
    motor_mount_fillet_of_mirror_2_piece_6 = motor_mount_fillet_of_mirror_2_piece_6 - Plane(origin=(0, 0, -60.544601445), x_dir=(-1, 0, 0), z_dir=(0, 0, 1)) * Cylinder(65.5, 254, mode=Mode.PRIVATE)
    motor_mount_fillet_of_mirror_2_piece_6 = split(motor_mount_fillet_of_mirror_2_piece_6, bisect_by=Plane(origin=(58.37165408, -25, -6.5), z_dir=(0, 0, -1)), keep=Keep.TOP, mode=Mode.PRIVATE)
    add(motor_mount_fillet_of_mirror_2_piece_6)
    with BuildSketch(Plane(origin=(58.37165408, -25, -60.544601445), x_dir=(1, 0, 0), z_dir=(0, 0, 1))) as motor_mount_fillet_of_mirror_2_piece_7_section:
        with BuildLine():
            CenterArc((26.817840578, -50), MOTOR_MOUNT_FILLET_OF_MIRROR_2_R, 90, 48.639624147)
            ThreePointArc((-10.710571166, -16.960352423), (-4.681350326, -8.905770642), (0, 0))
            Line((0, 0), (26.817840578, 0))
        make_face()
    motor_mount_fillet_of_mirror_2_piece_7 = extrude(amount=73.044601445, mode=Mode.PRIVATE)
    motor_mount_fillet_of_mirror_2_piece_7 = split(motor_mount_fillet_of_mirror_2_piece_7, bisect_by=Plane(origin=(58.37165408, -25, -12.5), z_dir=(0, 0, 1)), keep=Keep.TOP, mode=Mode.PRIVATE)
    motor_mount_fillet_of_mirror_2_piece_7 = motor_mount_fillet_of_mirror_2_piece_7 & Plane(origin=(0, 0, -60.544601445), x_dir=(-1, 0, 0), z_dir=(0, 0, 1)) * Cylinder(65.5, 254, mode=Mode.PRIVATE)
    motor_mount_fillet_of_mirror_2_piece_7 = split(motor_mount_fillet_of_mirror_2_piece_7, bisect_by=Plane(origin=(58.37165408, -25, -6.5), z_dir=(0, 0, -1)), keep=Keep.TOP, mode=Mode.PRIVATE)
    add(motor_mount_fillet_of_mirror_2_piece_7)
    with BuildSketch(Plane(origin=(58.37165408, -25, -60.544601445), x_dir=(1, 0, 0), z_dir=(0, 0, 1))) as motor_mount_fillet_of_mirror_2_piece_8_section:
        with BuildLine():
            CenterArc((26.817840578, -50), MOTOR_MOUNT_FILLET_OF_MIRROR_2_R, 90, 48.639624147)
            ThreePointArc((-10.710571166, -16.960352423), (-4.681350326, -8.905770642), (0, 0))
            Line((0, 0), (26.817840578, 0))
        make_face()
    motor_mount_fillet_of_mirror_2_piece_8 = extrude(amount=73.044601445, mode=Mode.PRIVATE)
    motor_mount_fillet_of_mirror_2_piece_8 = motor_mount_fillet_of_mirror_2_piece_8 - Plane(origin=(0, 0, -60.544601445), x_dir=(-1, 0, 0), z_dir=(0, 0, 1)) * Cylinder(65.5, 254, mode=Mode.PRIVATE)
    motor_mount_fillet_of_mirror_2_piece_8 = split(motor_mount_fillet_of_mirror_2_piece_8, bisect_by=Plane(origin=(58.37165408, -25, 6.5), z_dir=(0, 0, -1)), keep=Keep.TOP, mode=Mode.PRIVATE)
    motor_mount_fillet_of_mirror_2_piece_8 = split(motor_mount_fillet_of_mirror_2_piece_8, bisect_by=Plane(origin=(58.37165408, -25, -6.5), z_dir=(0, 0, 1)), keep=Keep.TOP, mode=Mode.PRIVATE)
    add(motor_mount_fillet_of_mirror_2_piece_8)
    with BuildSketch(Plane(origin=(58.37165408, -25, 6.5), x_dir=(1, 0, 0), z_dir=(0, 0, 1))) as motor_mount_fillet_of_mirror_2_piece_9_section:
        with BuildLine():
            CenterArc((26.817840578, -50), MOTOR_MOUNT_FILLET_OF_MIRROR_2_R, 90, 48.639624147)
            ThreePointArc((-10.710571166, -16.960352423), (-4.681350326, -8.905770642), (0, 0))
            Line((0, 0), (26.817840578, 0))
        make_face()
    motor_mount_fillet_of_mirror_2_piece_9 = extrude(amount=6, mode=Mode.PRIVATE)
    motor_mount_fillet_of_mirror_2_piece_9 = motor_mount_fillet_of_mirror_2_piece_9 - Plane(origin=(0, 0, 6.5), x_dir=(-1, 0, 0), z_dir=(0, 0, 1)) * Cylinder(65.5, 120, mode=Mode.PRIVATE)
    add(motor_mount_fillet_of_mirror_2_piece_9)
    with BuildSketch(Plane(origin=(58.37165408, -25, 6.5), x_dir=(1, 0, 0), z_dir=(0, 0, 1))) as motor_mount_fillet_of_mirror_2_piece_10_section:
        with BuildLine():
            CenterArc((26.817840578, -50), MOTOR_MOUNT_FILLET_OF_MIRROR_2_R, 90, 48.639624147)
            ThreePointArc((-10.710571166, -16.960352423), (-4.681350326, -8.905770642), (0, 0))
            Line((0, 0), (26.817840578, 0))
        make_face()
    motor_mount_fillet_of_mirror_2_piece_10 = extrude(amount=6, mode=Mode.PRIVATE)
    motor_mount_fillet_of_mirror_2_piece_10 = motor_mount_fillet_of_mirror_2_piece_10 & Plane(origin=(0, 0, 6.5), x_dir=(-1, 0, 0), z_dir=(0, 0, 1)) * Cylinder(65.5, 120, mode=Mode.PRIVATE)
    add(motor_mount_fillet_of_mirror_2_piece_10)

    # bolt holes: up to this cylinder (the profile starts outside it)
    bolt_holes_end = Plane(origin=(0, 0, 0), z_dir=(0, 0, 1)) * Cylinder(BOLT_HOLES_END_RADIUS, 521.006, mode=Mode.PRIVATE)
    # Sketch13 → bolt holes (cut, up to the surface)
    with BuildSketch(Plane(origin=(0, 75.236352085, 0), x_dir=(1, 0, 0), z_dir=(0, 1, 0)), mode=Mode.PRIVATE) as bolt_holes_sk1:
        with Locations(Location((-8.73125, 0, 0), (0, 0, 270))):
            Circle(SKETCH13_R)
    bolt_holes_tool1 = extrude(bolt_holes_sk1.sketch, amount=-BOLT_HOLES_REACH, mode=Mode.PRIVATE) - bolt_holes_end
    add(bolt_holes_tool1.solids().sort_by_distance((-8.73125, 75.236352, 0))[0], mode=Mode.SUBTRACT)
    # Sketch13 → bolt holes (cut, up to the surface)
    with BuildSketch(Plane(origin=(0, 75.236352085, 0), x_dir=(1, 0, 0), z_dir=(0, 1, 0)), mode=Mode.PRIVATE) as bolt_holes_sk2:
        with Locations(Location((8.73125, 0, 0), (0, 0, 270))):
            Circle(SKETCH13_R)
    bolt_holes_tool2 = extrude(bolt_holes_sk2.sketch, amount=-BOLT_HOLES_REACH, mode=Mode.PRIVATE) - bolt_holes_end
    add(bolt_holes_tool2.solids().sort_by_distance((8.73125, 75.236352, 0))[0], mode=Mode.SUBTRACT)

    # Sketch15 → main keyway (cut, through all)
    with BuildSketch(Plane(origin=(0, 0, 0), x_dir=(1, 0, 0), z_dir=(0, 1, 0))):
        Rectangle(SKETCH15_W, SKETCH15_H)
    extrude(amount=-MAIN_KEYWAY_DEPTH, mode=Mode.SUBTRACT)

    # Sketch19 → harness cut (cut, two sides: drawn at the far end of the back side and taken through both)
    with BuildSketch(Plane(origin=(0, 0, 0), x_dir=(0, 0, -1), z_dir=(1, 0, 0)).offset(-HARNESS_CUT_DEPTH_BACK)):
        with Locations((0, 60)):
            Rectangle(SKETCH19_W, SKETCH19_H)
    extrude(amount=HARNESS_CUT_DEPTH + HARNESS_CUT_DEPTH_BACK, mode=Mode.SUBTRACT)

    # Sketch22 → Cut-Extrude1 (cut, through all)
    with BuildSketch(Plane.XY.offset(12.5)):
        with Locations((0, 69.736352085)):
            Circle(SKETCH22_R)
    extrude(amount=-CUT_EXTRUDE1_DEPTH, mode=Mode.SUBTRACT)

    # Fillet1: read off the stored shape, not the designer's step
    # Fillet1 outline → Fillet1 (cut)
    with BuildSketch(Plane.XY.offset(FILLET1_START)):
        with BuildLine():
            ThreePointArc((-59.087777959, 32.353776423), (-57.878619737, 32.227392221), (-57.685055751, 31.02715493))
            ThreePointArc((-57.685055751, 31.02715493), (-56.632563018, 32.909007977), (-55.51870064, 34.755199313))
            ThreePointArc((-55.51870064, 34.755199313), (-57.277401474, 33.516086803), (-59.087777959, 32.353776423))
        make_face()
        with BuildLine():
            ThreePointArc((-55.51870064, -34.755199313), (-56.632563018, -32.909007977), (-57.685055751, -31.02715493))
            ThreePointArc((-57.685055751, -31.02715493), (-57.878619737, -32.227392221), (-59.087777959, -32.353776423))
            ThreePointArc((-59.087777959, -32.353776423), (-57.277401474, -33.516086803), (-55.51870064, -34.755199313))
        make_face()
        with BuildLine():
            ThreePointArc((-98.756269464, 23.076923077), (-99.352234755, 24.196116135), (-98.37165408, 25))
            Line((-98.37165408, 25), (-108.37165408, 25))
            ThreePointArc((-108.37165408, 25), (-103.468750701, 24.514516892), (-98.756269464, 23.076923077))
        make_face()
        with BuildLine():
            Line((-108.37165408, -25), (-98.37165408, -25))
            ThreePointArc((-98.37165408, -25), (-99.352234755, -24.196116135), (-98.756269464, -23.076923077))
            ThreePointArc((-98.756269464, -23.076923077), (-103.468750701, -24.514516892), (-108.37165408, -25))
        make_face()
        with BuildLine():
            ThreePointArc((98.37165408, 25), (99.352234755, 24.196116135), (98.756269464, 23.076923077))
            ThreePointArc((98.756269464, 23.076923077), (103.468750701, 24.514516892), (108.37165408, 25))
            Line((108.37165408, 25), (98.37165408, 25))
        make_face()
        with BuildLine():
            ThreePointArc((98.756269464, -23.076923077), (99.352234755, -24.196116135), (98.37165408, -25))
            Line((98.37165408, -25), (108.37165408, -25))
            ThreePointArc((108.37165408, -25), (103.468750701, -24.514516892), (98.756269464, -23.076923077))
        make_face()
        with BuildLine():
            ThreePointArc((59.087777959, -32.353776423), (57.878619737, -32.227392221), (57.685055751, -31.02715493))
            ThreePointArc((57.685055751, -31.02715493), (56.632563018, -32.909007977), (55.51870064, -34.755199313))
            ThreePointArc((55.51870064, -34.755199313), (57.277401474, -33.516086803), (59.087777959, -32.353776423))
        make_face()
    extrude(amount=FILLET1_DEPTH, mode=Mode.SUBTRACT)

    # Sketch18 → split for printing (cut, through all)
    with BuildSketch(Plane(origin=(0, 0, 0), x_dir=(0, 0, -1), z_dir=(1, 0, 0))):
        with Locations((3.413587171, -1.264778097)):
            Rectangle(SKETCH18_W, SKETCH18_H)
    extrude(amount=-SPLIT_FOR_PRINTING_DEPTH, mode=Mode.SUBTRACT)


solid = part.part
